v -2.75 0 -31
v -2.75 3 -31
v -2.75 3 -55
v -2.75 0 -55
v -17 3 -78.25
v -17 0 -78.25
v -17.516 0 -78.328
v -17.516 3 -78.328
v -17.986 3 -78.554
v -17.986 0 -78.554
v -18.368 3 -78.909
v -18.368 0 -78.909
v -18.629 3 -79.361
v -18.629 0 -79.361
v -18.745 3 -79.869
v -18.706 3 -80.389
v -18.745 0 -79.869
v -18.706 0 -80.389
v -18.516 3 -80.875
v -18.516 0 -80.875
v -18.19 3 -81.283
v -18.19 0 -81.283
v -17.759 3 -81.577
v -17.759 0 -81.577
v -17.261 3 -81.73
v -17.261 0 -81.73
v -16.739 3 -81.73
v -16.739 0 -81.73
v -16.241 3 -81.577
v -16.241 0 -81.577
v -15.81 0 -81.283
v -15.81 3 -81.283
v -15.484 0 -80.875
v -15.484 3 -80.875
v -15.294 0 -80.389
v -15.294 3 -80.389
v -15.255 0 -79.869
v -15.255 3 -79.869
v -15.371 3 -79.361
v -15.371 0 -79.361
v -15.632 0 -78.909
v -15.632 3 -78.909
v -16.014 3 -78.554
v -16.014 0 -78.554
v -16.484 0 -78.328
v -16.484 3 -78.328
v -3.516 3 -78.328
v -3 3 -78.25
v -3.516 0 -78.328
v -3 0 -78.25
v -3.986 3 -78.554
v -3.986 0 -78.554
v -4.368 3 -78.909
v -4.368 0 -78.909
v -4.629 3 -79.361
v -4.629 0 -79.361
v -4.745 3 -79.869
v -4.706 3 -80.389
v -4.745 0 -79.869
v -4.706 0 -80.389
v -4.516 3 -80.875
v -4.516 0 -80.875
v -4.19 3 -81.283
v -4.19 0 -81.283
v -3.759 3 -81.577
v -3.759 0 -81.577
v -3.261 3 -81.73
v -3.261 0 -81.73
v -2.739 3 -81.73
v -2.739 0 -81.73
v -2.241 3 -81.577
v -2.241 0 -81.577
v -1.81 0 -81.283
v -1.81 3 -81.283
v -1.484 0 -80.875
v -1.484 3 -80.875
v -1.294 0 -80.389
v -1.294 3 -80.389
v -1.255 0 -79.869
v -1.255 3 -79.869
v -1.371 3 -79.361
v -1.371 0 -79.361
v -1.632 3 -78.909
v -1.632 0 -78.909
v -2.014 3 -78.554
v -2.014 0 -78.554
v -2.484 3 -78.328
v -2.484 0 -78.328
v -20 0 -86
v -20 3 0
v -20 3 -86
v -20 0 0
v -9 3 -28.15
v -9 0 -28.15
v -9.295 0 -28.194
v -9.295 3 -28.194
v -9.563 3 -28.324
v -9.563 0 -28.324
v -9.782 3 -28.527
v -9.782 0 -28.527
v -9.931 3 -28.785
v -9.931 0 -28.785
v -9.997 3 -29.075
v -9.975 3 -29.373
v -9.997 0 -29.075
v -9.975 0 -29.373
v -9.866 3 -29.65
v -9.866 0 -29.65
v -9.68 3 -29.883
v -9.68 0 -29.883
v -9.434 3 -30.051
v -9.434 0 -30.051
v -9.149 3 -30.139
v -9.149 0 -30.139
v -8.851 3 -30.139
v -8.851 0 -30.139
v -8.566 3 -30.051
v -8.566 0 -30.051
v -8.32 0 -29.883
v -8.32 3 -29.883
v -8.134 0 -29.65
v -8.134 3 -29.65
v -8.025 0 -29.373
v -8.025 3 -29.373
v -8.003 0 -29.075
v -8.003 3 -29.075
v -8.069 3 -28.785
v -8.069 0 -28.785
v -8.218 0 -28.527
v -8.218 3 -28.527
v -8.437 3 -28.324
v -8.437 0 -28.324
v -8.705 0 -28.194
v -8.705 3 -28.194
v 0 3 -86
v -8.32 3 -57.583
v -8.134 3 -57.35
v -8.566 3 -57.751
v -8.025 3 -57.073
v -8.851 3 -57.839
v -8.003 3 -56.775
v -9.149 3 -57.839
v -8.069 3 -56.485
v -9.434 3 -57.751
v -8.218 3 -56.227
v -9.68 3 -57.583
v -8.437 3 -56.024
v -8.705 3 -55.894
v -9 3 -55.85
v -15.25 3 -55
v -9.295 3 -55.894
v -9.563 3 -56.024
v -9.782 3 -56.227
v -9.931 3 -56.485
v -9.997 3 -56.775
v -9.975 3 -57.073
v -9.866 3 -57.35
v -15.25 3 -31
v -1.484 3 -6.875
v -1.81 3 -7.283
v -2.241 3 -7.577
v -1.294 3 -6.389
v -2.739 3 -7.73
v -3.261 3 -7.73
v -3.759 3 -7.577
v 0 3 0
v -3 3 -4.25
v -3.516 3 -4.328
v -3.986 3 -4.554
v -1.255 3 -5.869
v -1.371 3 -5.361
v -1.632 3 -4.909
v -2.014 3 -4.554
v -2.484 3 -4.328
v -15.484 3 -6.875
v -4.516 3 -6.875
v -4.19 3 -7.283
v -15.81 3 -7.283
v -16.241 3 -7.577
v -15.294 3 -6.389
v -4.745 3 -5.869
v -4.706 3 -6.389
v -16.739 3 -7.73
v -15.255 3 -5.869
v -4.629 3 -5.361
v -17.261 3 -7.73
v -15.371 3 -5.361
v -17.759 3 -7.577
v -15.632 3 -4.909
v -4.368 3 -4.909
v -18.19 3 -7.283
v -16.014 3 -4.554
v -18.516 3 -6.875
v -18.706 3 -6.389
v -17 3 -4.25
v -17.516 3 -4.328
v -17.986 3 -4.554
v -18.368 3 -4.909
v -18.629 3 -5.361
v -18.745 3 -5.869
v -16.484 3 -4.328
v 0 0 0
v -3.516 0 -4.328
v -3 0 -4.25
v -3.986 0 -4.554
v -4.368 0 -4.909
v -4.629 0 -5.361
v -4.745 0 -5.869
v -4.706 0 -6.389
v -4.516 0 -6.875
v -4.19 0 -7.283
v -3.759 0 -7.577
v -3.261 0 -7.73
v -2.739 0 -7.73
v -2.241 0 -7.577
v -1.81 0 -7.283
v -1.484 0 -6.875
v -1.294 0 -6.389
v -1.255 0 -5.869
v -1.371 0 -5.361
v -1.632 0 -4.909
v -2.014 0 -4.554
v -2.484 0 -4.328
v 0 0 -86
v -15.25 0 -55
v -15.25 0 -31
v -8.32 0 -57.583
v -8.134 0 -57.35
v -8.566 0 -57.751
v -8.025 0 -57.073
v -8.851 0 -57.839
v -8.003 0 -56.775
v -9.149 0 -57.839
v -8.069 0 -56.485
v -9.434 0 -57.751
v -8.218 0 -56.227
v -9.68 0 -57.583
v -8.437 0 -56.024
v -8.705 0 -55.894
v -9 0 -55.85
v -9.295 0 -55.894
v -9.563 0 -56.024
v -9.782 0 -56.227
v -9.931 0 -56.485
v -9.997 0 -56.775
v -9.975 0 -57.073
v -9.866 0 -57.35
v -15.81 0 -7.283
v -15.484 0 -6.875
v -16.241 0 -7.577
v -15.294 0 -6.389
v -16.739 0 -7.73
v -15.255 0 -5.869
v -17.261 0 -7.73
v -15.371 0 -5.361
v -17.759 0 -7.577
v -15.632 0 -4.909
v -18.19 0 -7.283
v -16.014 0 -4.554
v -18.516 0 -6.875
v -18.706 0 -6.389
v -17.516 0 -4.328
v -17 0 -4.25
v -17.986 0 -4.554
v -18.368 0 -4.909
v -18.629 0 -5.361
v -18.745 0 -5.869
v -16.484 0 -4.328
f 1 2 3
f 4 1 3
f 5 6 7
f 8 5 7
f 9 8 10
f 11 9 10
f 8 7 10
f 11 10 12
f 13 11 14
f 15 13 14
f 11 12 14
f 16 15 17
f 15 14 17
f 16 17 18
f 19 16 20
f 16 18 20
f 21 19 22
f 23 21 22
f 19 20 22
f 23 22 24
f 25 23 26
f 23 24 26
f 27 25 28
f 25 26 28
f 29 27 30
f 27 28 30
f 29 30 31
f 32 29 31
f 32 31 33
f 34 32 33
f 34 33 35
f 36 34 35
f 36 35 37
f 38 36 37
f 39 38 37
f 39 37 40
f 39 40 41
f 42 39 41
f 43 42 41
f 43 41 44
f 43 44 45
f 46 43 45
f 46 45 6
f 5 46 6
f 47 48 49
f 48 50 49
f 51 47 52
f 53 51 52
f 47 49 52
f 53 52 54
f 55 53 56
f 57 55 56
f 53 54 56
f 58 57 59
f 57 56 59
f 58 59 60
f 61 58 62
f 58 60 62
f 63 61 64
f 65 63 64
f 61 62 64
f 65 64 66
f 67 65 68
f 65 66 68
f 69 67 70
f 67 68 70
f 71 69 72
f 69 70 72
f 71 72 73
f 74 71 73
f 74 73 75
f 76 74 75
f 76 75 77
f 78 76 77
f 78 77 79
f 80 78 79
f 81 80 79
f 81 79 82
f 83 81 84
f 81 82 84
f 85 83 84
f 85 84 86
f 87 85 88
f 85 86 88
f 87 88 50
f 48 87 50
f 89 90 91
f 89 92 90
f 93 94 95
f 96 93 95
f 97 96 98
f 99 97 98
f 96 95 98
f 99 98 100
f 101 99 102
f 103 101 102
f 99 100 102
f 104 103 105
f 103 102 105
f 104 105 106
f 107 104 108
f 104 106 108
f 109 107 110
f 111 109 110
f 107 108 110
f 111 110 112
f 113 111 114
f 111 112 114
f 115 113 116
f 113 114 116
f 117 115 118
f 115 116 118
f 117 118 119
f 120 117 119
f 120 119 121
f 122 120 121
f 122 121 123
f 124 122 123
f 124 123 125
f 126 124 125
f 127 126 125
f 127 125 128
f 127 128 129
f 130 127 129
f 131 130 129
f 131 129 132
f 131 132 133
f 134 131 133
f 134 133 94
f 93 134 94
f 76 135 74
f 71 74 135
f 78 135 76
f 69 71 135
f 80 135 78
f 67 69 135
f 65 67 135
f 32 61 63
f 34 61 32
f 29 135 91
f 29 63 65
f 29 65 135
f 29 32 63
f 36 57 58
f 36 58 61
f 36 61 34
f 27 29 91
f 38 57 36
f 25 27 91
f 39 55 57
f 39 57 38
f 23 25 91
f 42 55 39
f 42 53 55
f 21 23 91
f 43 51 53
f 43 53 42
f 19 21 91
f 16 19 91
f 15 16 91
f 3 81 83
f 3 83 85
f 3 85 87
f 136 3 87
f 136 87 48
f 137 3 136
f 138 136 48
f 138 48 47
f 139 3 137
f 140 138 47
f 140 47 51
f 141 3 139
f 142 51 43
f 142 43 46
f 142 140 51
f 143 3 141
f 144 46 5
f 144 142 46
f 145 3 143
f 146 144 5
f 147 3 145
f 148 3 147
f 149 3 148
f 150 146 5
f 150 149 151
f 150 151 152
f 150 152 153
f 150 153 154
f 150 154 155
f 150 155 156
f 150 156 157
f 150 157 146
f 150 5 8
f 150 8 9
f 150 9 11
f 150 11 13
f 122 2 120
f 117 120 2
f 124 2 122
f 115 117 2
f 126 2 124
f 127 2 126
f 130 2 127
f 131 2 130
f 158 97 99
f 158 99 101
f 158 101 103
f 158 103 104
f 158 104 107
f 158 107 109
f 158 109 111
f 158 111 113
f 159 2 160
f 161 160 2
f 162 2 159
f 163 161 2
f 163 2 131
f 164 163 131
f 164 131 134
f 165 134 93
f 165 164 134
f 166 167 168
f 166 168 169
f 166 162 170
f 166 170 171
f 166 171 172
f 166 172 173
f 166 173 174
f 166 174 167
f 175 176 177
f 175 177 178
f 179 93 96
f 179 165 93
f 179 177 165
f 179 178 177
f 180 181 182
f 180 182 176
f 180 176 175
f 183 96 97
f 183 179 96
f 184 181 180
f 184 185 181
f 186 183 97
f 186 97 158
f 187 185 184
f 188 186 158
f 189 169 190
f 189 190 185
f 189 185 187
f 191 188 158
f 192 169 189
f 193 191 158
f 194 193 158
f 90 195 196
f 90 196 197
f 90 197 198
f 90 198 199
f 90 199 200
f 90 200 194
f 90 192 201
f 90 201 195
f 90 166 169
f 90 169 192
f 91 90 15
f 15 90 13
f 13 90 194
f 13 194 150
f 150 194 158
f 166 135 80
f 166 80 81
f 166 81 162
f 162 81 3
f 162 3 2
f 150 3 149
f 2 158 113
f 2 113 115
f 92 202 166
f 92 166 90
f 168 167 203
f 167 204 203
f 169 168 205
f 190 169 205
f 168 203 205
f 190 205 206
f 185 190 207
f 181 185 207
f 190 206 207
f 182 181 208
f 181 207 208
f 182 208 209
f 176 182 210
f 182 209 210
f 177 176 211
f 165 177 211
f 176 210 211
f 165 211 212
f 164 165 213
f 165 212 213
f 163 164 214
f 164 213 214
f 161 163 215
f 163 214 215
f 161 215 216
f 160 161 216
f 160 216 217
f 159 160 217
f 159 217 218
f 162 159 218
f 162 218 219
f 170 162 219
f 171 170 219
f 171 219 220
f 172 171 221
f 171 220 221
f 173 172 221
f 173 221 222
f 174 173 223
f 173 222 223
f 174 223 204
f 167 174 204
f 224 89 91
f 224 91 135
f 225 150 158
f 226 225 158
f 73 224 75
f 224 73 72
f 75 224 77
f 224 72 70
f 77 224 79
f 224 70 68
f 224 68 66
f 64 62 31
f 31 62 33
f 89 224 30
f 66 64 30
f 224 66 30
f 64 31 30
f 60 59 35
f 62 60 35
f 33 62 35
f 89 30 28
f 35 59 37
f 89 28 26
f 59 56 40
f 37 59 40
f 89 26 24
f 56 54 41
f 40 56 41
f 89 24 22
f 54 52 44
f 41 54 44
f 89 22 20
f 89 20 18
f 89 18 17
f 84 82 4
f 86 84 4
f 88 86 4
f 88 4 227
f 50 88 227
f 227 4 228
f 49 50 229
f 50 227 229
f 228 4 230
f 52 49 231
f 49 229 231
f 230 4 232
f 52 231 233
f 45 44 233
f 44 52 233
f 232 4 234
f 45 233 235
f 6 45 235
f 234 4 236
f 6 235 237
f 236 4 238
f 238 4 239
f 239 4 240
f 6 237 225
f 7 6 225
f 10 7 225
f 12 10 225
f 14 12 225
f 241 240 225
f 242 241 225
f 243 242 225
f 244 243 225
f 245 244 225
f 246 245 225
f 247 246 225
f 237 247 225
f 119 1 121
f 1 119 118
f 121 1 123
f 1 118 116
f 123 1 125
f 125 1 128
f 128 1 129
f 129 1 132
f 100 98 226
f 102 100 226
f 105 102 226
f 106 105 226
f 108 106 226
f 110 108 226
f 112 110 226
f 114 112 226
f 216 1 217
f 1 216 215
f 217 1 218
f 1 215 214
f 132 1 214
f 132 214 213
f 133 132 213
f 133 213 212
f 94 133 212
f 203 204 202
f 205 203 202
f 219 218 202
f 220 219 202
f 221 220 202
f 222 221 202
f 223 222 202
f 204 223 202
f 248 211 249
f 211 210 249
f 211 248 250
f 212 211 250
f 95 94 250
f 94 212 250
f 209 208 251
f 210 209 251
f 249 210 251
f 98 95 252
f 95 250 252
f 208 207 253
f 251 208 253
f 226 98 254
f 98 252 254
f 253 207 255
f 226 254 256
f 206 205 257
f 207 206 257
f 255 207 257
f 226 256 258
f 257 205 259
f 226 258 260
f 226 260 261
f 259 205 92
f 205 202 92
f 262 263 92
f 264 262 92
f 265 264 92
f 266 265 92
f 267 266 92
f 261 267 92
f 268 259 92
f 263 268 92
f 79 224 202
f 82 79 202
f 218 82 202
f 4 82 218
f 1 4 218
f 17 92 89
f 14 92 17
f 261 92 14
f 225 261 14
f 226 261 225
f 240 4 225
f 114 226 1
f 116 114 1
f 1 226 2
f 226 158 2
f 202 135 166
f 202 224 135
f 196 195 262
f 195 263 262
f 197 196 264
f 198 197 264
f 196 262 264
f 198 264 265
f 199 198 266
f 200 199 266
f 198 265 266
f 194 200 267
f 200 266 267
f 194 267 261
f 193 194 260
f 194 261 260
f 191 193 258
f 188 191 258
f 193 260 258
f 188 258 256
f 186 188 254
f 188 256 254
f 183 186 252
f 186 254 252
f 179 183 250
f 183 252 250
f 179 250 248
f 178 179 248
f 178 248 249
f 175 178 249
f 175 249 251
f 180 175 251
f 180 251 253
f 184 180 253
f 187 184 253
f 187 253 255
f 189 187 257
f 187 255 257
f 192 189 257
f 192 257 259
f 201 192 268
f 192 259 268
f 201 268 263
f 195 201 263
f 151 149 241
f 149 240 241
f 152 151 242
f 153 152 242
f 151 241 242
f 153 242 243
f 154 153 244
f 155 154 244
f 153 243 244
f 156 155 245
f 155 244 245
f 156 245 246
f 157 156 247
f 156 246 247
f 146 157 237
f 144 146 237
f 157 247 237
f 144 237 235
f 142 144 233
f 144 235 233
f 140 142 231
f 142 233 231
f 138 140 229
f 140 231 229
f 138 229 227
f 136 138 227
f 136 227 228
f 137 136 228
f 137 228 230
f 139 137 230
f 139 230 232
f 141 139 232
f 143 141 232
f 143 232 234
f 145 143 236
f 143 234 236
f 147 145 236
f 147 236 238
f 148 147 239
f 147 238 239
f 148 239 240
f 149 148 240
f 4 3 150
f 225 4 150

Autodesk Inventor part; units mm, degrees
ref_plane "YZ Plane" through (0, 0, 0) normal (1, 0, 0) x (0, 1, 0)
ref_plane "XZ Plane" through (0, 0, 0) normal (0, 1, 0) x (-1, 0, 0)
ref_plane "XY Plane" through (0, 0, 0) normal (0, 0, 1) x (1, 0, 0)
sketch "Esquisse1" plane through (0, 0, 0) normal (0, 1, 0) x (-1, 0, 0)
  line L0 (0, 0) -> (20, 0)
  line L1 (20, 0) -> (20, -86)
  line L2 (20, -86) -> (0, -86)
  line L3 (0, -86) -> (0, 0)
  dimension "d0" = 86
  dimension "d1" = 20
extrude "Extrusion1" add sketch "Esquisse1" along normal blind 3
sketch "Esquisse2" plane through (0, 3, 0) normal (0, 1, 0) x (1, 0, 0)
  line L0 (-20, 0) -> (0, 0) projected
  line L1 (0, 0) -> (0, 86) projected
  line L2 (10.8927, 42.5) -> (-28.8955, 42.5) construction
  point P0 (-3, 6)
  dimension "d12" = 3
  dimension "d37" = 42.5
  dimension "d39" = 36.5
hole "Perçage1" at (-3, 3, -6) direction (0, -1, 0) diameter 3.5 end through all
pattern_linear "Réseau rectangulaire1" count 2 spacing 14 along (-1, 0, 0) count 2 spacing 74 along (0, 0, -1) of "Perçage1"
sketch "Esquisse3" plane through (0, 3, 0) normal (0, 1, 0) x (1, 0, 0)
  line L0 (-15.25, 31) -> (-2.75, 31)
  line L1 (-2.75, 31) -> (-2.75, 55)
  line L2 (-2.75, 55) -> (-15.25, 55)
  line L3 (-15.25, 55) -> (-15.25, 31)
  line L4 (0, 86) -> (-20, 86) projected
  line L5 (-20, 86) -> (-20, 0) projected
  point P0 (0, 0)
  dimension "d19" = 24
  dimension "d20" = 12.5
  dimension "d21" = 31
  dimension "d22" = 4.75
extrude "Extrusion2" cut sketch "Esquisse3" against normal through all
sketch "Esquisse4" plane through (0, 3, 0) normal (0, 1, 0) x (1, 0, 0)
  line L0 (-2.75, 55) -> (-2.75, 31) projected
  line L1 (-2.75, 31) -> (-15.25, 31) projected
  point P0 (0, 0)
  point P1 (-9, 29.15)
  dimension "d32" = 6.25
  dimension "d33" = 1.85
hole "Perçage2" at (-9, 3, -29.15) direction (0, -1, 0) diameter 2 end through all
pattern_linear "Réseau rectangulaire2" count 2 spacing 27.7 along (0, 0, -1) of "Perçage2"
properties part number "support_servo_moteur"
